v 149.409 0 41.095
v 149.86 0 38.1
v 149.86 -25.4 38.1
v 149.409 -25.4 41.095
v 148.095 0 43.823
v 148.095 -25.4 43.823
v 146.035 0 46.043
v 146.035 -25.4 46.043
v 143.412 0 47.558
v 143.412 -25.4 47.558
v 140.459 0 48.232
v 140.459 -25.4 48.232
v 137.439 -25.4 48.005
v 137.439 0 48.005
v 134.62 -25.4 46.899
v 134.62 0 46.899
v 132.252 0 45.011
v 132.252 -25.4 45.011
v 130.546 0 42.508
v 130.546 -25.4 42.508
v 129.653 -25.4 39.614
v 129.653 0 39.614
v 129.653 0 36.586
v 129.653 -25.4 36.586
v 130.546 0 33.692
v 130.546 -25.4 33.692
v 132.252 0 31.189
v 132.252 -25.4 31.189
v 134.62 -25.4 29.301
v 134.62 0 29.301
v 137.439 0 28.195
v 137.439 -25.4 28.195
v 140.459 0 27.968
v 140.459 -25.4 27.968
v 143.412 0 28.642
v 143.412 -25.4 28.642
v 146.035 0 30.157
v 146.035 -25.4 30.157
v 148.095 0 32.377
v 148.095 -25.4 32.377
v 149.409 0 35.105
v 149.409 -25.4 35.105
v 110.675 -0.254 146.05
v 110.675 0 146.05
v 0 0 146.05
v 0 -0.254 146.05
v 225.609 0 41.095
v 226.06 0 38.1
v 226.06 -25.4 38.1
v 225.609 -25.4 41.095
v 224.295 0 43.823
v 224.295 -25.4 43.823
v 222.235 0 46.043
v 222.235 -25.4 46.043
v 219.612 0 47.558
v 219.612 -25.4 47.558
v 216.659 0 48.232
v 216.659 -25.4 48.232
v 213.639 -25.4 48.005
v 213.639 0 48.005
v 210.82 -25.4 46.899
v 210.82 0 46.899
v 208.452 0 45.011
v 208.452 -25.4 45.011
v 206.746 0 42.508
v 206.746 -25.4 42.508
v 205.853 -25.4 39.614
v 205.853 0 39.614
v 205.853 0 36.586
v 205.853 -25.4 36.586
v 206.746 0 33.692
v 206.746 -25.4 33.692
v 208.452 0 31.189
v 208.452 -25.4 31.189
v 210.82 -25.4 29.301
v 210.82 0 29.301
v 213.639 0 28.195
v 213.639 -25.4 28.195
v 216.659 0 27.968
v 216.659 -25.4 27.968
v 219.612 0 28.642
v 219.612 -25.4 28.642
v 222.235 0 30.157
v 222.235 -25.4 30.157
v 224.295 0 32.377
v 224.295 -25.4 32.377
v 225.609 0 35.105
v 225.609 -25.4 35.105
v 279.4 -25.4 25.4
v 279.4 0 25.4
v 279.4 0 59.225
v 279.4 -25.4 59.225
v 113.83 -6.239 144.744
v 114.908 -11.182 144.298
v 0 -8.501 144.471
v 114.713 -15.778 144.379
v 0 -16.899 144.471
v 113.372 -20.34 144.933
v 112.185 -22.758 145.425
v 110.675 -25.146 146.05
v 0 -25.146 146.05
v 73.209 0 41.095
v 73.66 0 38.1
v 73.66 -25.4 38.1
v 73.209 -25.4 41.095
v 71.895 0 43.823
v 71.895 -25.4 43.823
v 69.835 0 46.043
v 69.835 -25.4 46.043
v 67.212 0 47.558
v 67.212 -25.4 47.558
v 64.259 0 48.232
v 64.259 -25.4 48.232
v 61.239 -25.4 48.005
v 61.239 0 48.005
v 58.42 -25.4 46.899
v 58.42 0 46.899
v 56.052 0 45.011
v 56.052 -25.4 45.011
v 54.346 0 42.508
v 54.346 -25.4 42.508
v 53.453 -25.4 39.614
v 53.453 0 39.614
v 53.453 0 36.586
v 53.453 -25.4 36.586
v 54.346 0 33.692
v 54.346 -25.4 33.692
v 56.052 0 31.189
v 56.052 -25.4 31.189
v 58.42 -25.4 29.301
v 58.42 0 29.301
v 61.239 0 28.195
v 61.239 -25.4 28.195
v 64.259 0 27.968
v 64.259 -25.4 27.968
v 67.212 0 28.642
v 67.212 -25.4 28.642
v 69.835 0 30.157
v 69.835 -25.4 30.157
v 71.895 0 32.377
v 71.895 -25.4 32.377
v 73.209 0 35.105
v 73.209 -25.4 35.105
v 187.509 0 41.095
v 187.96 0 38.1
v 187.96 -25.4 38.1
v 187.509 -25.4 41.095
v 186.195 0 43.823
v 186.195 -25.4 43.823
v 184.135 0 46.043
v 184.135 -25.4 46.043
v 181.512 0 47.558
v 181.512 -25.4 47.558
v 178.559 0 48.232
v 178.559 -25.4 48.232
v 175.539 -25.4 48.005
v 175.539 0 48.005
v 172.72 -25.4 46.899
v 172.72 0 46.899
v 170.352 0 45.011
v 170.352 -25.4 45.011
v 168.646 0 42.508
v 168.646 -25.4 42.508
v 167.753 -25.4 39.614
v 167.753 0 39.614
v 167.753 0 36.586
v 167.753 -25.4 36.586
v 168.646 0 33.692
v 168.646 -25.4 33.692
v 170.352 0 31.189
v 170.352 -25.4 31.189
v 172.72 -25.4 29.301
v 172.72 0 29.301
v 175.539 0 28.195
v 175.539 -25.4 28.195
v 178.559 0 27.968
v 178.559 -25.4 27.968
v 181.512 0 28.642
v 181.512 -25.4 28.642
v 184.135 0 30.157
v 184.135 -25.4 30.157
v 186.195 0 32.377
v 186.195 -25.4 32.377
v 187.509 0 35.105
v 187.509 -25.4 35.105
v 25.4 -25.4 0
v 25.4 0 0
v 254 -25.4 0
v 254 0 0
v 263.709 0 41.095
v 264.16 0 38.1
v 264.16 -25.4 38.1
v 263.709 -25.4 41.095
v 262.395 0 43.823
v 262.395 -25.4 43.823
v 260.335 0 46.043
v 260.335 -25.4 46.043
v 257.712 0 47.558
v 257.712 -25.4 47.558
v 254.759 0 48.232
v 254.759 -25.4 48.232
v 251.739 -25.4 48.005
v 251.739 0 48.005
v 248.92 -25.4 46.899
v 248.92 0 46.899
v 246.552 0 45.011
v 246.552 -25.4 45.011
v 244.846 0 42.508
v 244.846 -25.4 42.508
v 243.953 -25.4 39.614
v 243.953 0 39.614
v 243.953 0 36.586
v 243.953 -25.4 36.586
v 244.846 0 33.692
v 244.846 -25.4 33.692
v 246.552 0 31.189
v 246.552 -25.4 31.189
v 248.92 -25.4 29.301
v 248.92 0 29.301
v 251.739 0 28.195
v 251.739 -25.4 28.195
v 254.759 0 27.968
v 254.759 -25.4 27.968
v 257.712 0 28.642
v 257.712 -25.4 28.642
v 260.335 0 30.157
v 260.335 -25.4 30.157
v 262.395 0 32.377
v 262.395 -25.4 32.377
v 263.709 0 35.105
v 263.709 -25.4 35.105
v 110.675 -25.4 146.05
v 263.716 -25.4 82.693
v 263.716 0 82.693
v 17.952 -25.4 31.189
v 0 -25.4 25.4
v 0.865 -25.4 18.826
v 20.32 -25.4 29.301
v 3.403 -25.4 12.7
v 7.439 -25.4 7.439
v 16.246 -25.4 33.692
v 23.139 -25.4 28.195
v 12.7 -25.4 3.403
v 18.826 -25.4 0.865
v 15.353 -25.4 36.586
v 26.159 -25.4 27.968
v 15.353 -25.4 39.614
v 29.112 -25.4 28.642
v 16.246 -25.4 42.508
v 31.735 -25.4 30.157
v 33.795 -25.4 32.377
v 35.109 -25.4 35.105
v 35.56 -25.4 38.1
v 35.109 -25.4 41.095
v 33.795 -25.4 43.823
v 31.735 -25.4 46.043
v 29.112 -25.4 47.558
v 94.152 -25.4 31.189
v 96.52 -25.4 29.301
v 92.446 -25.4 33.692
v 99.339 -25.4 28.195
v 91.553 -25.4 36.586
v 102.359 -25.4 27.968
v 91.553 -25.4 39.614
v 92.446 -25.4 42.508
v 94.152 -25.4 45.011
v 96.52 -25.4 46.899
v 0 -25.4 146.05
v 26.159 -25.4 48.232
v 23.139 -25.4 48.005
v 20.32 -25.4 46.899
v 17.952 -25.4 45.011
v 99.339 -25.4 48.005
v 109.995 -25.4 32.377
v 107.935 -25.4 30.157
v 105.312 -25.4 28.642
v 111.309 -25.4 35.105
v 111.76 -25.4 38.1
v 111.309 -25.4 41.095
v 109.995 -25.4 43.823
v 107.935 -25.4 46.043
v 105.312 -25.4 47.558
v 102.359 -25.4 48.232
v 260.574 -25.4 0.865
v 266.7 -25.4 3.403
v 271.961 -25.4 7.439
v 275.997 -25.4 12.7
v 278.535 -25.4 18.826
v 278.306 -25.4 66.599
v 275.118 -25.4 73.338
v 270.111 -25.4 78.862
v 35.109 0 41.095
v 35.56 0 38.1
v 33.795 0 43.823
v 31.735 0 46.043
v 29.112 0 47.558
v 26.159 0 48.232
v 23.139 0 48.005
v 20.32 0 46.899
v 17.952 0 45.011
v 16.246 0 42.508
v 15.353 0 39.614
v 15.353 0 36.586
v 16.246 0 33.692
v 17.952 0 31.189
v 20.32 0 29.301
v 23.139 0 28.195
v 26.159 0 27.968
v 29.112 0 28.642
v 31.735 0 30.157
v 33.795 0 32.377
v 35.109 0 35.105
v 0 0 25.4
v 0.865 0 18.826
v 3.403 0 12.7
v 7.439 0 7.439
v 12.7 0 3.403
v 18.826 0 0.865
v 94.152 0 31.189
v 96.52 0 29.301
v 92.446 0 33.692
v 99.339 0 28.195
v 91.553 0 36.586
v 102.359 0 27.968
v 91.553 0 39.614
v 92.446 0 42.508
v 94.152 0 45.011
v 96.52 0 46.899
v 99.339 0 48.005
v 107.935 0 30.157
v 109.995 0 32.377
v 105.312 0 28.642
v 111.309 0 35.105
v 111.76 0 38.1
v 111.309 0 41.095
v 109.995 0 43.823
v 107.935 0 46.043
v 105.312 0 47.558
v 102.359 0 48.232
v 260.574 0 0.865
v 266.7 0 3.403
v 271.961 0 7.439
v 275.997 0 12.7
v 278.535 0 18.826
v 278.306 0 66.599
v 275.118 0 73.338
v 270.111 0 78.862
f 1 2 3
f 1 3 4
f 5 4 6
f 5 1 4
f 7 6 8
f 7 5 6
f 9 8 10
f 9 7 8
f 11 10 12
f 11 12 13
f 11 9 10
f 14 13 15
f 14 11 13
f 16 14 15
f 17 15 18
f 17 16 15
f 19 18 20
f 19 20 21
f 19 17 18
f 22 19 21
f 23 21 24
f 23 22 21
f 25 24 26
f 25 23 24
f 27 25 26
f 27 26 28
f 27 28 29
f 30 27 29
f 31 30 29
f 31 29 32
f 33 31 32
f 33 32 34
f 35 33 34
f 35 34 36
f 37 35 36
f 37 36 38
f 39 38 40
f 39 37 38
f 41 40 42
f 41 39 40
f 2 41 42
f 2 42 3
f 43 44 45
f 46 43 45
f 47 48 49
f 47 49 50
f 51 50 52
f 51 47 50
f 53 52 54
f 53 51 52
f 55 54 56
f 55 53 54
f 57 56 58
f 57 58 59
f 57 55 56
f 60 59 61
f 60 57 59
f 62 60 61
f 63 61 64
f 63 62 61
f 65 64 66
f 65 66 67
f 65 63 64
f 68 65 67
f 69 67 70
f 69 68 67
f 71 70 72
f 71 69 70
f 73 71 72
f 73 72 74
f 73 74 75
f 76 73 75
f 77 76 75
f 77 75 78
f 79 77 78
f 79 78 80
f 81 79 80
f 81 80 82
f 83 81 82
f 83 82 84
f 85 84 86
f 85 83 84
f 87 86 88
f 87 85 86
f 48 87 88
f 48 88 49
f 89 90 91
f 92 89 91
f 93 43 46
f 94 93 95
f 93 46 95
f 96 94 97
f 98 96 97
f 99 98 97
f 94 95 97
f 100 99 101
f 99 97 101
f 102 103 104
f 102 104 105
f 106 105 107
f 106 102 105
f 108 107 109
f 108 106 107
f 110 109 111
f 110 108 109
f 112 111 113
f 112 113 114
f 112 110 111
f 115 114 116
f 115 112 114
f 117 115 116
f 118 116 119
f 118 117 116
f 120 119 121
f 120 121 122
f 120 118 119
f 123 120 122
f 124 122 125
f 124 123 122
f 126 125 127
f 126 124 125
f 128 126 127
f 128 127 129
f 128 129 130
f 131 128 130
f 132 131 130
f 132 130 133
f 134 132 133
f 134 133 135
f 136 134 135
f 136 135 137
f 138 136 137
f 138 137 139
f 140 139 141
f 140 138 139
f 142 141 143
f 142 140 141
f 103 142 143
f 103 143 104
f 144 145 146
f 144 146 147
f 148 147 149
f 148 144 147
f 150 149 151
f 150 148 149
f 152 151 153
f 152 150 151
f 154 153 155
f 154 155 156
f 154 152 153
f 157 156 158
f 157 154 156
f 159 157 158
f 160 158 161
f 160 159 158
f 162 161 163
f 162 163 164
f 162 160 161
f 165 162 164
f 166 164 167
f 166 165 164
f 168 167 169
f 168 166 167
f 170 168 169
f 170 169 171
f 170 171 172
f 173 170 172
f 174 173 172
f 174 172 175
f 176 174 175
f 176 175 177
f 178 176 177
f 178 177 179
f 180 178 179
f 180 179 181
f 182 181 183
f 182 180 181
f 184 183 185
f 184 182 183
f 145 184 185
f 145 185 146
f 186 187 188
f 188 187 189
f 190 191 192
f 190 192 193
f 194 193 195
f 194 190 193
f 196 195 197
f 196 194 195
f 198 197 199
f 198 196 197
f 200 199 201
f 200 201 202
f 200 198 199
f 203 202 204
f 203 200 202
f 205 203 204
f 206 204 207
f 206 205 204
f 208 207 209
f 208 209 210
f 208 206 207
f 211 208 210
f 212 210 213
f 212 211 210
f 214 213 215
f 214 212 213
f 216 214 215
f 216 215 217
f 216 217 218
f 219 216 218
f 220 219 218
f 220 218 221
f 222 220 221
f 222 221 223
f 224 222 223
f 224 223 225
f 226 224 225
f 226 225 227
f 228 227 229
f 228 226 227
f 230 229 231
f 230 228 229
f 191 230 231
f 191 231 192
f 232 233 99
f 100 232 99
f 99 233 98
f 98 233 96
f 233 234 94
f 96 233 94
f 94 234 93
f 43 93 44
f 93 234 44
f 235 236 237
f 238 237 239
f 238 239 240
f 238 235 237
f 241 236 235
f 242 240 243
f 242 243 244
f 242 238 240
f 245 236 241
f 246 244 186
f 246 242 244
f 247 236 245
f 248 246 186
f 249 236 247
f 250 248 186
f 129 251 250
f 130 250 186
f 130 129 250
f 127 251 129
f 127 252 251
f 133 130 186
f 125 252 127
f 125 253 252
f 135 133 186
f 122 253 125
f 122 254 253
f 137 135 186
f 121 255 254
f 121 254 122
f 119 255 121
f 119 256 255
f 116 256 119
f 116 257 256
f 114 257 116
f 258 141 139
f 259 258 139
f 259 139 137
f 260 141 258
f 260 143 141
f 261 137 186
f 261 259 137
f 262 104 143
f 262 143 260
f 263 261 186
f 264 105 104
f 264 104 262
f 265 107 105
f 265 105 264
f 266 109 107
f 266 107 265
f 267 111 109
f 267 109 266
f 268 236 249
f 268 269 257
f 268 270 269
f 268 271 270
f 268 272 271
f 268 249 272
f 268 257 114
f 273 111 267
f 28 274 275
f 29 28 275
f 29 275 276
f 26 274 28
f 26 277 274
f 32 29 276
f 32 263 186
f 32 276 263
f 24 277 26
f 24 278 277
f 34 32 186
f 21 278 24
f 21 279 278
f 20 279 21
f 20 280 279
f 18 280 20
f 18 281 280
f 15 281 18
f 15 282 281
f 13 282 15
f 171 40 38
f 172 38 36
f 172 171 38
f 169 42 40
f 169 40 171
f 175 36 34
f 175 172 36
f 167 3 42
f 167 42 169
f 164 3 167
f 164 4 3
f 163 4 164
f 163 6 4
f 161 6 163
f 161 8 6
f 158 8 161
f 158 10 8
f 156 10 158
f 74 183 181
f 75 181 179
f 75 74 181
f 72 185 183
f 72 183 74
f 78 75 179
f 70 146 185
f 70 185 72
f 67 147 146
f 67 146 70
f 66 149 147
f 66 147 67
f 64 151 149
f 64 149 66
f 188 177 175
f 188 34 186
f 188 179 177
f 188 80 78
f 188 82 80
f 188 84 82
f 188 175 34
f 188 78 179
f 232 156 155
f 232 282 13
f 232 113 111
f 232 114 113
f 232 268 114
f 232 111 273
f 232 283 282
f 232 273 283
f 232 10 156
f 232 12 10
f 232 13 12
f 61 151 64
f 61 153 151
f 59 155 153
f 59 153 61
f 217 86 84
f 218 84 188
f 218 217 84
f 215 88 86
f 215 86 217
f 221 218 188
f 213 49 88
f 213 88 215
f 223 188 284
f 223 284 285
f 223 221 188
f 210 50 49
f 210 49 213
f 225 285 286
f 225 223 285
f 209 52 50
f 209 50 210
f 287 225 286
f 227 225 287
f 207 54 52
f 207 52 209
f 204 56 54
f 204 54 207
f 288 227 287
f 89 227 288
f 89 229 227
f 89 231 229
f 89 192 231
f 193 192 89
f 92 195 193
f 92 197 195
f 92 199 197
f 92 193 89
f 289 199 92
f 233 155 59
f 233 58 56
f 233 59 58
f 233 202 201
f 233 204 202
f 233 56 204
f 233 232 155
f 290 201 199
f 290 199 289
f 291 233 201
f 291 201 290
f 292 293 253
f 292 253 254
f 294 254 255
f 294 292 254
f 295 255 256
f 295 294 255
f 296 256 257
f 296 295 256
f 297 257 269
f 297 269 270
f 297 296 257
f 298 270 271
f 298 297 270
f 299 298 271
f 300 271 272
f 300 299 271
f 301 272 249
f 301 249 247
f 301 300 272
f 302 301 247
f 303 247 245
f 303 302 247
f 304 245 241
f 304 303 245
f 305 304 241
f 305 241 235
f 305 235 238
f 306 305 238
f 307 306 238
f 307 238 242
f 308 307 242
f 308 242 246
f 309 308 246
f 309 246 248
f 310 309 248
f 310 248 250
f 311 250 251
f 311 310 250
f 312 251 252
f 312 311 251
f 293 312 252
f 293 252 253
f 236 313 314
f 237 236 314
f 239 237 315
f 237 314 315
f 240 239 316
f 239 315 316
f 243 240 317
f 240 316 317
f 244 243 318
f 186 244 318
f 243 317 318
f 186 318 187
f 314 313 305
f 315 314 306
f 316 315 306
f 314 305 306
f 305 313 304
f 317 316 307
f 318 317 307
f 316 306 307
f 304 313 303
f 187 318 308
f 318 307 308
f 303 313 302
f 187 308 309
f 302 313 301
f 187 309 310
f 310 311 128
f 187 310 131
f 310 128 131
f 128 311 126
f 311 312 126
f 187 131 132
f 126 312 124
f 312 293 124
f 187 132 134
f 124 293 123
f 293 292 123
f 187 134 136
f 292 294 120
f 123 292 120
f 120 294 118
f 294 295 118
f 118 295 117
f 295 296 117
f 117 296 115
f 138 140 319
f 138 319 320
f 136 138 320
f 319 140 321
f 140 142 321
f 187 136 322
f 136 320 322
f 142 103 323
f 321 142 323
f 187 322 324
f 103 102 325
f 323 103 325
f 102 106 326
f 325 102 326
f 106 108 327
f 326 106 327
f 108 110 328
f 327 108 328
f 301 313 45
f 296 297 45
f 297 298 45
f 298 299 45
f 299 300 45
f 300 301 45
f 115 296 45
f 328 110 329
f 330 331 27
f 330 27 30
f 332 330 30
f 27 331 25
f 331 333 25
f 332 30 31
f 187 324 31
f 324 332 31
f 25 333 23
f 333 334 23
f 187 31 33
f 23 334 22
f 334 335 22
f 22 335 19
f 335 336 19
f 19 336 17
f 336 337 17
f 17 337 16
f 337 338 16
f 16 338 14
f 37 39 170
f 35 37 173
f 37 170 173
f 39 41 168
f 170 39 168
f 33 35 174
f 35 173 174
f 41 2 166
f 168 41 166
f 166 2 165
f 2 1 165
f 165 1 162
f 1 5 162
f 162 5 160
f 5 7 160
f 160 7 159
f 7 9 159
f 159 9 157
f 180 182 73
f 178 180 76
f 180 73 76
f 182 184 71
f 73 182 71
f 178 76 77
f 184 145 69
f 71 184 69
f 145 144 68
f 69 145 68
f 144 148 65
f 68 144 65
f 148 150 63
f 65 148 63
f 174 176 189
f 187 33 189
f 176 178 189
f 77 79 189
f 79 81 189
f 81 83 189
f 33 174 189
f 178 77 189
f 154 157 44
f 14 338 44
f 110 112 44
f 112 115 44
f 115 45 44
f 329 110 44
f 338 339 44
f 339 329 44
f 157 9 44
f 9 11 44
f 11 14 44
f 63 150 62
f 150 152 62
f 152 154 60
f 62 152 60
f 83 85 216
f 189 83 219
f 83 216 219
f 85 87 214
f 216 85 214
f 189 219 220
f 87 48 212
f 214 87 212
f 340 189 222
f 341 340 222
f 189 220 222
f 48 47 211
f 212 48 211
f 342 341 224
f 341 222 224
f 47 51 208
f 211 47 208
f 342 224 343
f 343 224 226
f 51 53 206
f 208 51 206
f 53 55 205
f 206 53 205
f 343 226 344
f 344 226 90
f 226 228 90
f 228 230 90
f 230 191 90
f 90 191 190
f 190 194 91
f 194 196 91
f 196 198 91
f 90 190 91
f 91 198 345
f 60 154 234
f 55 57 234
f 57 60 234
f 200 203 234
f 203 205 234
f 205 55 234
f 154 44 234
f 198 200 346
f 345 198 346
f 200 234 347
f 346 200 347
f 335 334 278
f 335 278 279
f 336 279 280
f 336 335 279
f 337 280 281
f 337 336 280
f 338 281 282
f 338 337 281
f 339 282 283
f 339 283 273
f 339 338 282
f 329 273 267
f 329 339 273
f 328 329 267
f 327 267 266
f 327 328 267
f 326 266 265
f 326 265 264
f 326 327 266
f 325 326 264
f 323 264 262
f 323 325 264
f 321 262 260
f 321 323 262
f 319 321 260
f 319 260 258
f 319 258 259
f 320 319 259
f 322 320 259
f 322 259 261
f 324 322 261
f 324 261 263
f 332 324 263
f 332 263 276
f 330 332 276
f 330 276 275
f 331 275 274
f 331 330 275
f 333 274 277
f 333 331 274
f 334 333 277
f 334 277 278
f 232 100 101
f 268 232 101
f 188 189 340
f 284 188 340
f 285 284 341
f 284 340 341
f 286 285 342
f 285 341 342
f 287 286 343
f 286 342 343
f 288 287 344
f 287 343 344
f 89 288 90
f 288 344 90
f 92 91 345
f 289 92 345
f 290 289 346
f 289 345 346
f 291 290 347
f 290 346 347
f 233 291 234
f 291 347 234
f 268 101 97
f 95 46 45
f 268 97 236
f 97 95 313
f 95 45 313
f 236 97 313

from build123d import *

# Parameters (mm, degrees)
F0_R     = 10.16
F1_DEPTH = 25.4
F3_DEPTH = 152.4


with BuildPart() as f1:
    # F0 (on Front) → F1 (new body)
    with BuildSketch(Plane.XZ):
        with BuildLine():
            Line((0, 146.05), (0, 25.4))
            ThreePointArc((0, 25.4), (7.439488, 7.439488), (25.4, 0))
            Line((25.4, 0), (254, 0))
            ThreePointArc((254, 0), (271.960512, 7.439488), (279.4, 25.4))
            Line((279.4, 25.4), (279.4, 59.22473))
            ThreePointArc((279.4, 59.22473), (275.117971, 73.338244), (263.715646, 82.693139))
            Line((263.715646, 82.693139), (110.67542, 146.05))
            Line((110.67542, 146.05), (0, 146.05))
        make_face()
        with Locations((25.4, 38.1)):
            Circle(F0_R, mode=Mode.SUBTRACT)
        with Locations((63.5, 38.1)):
            Circle(F0_R, mode=Mode.SUBTRACT)
        with Locations((101.6, 38.1)):
            Circle(F0_R, mode=Mode.SUBTRACT)
        with Locations((139.7, 38.1)):
            Circle(F0_R, mode=Mode.SUBTRACT)
        with Locations((177.8, 38.1)):
            Circle(F0_R, mode=Mode.SUBTRACT)
        with Locations((215.9, 38.1)):
            Circle(F0_R, mode=Mode.SUBTRACT)
        with Locations((254, 38.1)):
            Circle(F0_R, mode=Mode.SUBTRACT)
    extrude(amount=F1_DEPTH)

    # F2 (on face) → F3 (cut)
    with BuildSketch(Plane(origin=(0, 0, 0), x_dir=(0, -1, 0), z_dir=(-1, 0, 0))):
        with BuildLine():
            Line((25.146, 146.05), (0.254, 146.05))
            ThreePointArc((0.254, 146.05), (12.7, 144.272), (25.146, 146.05))
        make_face()
    extrude(amount=-F3_DEPTH, mode=Mode.SUBTRACT)


solid = f1.part
